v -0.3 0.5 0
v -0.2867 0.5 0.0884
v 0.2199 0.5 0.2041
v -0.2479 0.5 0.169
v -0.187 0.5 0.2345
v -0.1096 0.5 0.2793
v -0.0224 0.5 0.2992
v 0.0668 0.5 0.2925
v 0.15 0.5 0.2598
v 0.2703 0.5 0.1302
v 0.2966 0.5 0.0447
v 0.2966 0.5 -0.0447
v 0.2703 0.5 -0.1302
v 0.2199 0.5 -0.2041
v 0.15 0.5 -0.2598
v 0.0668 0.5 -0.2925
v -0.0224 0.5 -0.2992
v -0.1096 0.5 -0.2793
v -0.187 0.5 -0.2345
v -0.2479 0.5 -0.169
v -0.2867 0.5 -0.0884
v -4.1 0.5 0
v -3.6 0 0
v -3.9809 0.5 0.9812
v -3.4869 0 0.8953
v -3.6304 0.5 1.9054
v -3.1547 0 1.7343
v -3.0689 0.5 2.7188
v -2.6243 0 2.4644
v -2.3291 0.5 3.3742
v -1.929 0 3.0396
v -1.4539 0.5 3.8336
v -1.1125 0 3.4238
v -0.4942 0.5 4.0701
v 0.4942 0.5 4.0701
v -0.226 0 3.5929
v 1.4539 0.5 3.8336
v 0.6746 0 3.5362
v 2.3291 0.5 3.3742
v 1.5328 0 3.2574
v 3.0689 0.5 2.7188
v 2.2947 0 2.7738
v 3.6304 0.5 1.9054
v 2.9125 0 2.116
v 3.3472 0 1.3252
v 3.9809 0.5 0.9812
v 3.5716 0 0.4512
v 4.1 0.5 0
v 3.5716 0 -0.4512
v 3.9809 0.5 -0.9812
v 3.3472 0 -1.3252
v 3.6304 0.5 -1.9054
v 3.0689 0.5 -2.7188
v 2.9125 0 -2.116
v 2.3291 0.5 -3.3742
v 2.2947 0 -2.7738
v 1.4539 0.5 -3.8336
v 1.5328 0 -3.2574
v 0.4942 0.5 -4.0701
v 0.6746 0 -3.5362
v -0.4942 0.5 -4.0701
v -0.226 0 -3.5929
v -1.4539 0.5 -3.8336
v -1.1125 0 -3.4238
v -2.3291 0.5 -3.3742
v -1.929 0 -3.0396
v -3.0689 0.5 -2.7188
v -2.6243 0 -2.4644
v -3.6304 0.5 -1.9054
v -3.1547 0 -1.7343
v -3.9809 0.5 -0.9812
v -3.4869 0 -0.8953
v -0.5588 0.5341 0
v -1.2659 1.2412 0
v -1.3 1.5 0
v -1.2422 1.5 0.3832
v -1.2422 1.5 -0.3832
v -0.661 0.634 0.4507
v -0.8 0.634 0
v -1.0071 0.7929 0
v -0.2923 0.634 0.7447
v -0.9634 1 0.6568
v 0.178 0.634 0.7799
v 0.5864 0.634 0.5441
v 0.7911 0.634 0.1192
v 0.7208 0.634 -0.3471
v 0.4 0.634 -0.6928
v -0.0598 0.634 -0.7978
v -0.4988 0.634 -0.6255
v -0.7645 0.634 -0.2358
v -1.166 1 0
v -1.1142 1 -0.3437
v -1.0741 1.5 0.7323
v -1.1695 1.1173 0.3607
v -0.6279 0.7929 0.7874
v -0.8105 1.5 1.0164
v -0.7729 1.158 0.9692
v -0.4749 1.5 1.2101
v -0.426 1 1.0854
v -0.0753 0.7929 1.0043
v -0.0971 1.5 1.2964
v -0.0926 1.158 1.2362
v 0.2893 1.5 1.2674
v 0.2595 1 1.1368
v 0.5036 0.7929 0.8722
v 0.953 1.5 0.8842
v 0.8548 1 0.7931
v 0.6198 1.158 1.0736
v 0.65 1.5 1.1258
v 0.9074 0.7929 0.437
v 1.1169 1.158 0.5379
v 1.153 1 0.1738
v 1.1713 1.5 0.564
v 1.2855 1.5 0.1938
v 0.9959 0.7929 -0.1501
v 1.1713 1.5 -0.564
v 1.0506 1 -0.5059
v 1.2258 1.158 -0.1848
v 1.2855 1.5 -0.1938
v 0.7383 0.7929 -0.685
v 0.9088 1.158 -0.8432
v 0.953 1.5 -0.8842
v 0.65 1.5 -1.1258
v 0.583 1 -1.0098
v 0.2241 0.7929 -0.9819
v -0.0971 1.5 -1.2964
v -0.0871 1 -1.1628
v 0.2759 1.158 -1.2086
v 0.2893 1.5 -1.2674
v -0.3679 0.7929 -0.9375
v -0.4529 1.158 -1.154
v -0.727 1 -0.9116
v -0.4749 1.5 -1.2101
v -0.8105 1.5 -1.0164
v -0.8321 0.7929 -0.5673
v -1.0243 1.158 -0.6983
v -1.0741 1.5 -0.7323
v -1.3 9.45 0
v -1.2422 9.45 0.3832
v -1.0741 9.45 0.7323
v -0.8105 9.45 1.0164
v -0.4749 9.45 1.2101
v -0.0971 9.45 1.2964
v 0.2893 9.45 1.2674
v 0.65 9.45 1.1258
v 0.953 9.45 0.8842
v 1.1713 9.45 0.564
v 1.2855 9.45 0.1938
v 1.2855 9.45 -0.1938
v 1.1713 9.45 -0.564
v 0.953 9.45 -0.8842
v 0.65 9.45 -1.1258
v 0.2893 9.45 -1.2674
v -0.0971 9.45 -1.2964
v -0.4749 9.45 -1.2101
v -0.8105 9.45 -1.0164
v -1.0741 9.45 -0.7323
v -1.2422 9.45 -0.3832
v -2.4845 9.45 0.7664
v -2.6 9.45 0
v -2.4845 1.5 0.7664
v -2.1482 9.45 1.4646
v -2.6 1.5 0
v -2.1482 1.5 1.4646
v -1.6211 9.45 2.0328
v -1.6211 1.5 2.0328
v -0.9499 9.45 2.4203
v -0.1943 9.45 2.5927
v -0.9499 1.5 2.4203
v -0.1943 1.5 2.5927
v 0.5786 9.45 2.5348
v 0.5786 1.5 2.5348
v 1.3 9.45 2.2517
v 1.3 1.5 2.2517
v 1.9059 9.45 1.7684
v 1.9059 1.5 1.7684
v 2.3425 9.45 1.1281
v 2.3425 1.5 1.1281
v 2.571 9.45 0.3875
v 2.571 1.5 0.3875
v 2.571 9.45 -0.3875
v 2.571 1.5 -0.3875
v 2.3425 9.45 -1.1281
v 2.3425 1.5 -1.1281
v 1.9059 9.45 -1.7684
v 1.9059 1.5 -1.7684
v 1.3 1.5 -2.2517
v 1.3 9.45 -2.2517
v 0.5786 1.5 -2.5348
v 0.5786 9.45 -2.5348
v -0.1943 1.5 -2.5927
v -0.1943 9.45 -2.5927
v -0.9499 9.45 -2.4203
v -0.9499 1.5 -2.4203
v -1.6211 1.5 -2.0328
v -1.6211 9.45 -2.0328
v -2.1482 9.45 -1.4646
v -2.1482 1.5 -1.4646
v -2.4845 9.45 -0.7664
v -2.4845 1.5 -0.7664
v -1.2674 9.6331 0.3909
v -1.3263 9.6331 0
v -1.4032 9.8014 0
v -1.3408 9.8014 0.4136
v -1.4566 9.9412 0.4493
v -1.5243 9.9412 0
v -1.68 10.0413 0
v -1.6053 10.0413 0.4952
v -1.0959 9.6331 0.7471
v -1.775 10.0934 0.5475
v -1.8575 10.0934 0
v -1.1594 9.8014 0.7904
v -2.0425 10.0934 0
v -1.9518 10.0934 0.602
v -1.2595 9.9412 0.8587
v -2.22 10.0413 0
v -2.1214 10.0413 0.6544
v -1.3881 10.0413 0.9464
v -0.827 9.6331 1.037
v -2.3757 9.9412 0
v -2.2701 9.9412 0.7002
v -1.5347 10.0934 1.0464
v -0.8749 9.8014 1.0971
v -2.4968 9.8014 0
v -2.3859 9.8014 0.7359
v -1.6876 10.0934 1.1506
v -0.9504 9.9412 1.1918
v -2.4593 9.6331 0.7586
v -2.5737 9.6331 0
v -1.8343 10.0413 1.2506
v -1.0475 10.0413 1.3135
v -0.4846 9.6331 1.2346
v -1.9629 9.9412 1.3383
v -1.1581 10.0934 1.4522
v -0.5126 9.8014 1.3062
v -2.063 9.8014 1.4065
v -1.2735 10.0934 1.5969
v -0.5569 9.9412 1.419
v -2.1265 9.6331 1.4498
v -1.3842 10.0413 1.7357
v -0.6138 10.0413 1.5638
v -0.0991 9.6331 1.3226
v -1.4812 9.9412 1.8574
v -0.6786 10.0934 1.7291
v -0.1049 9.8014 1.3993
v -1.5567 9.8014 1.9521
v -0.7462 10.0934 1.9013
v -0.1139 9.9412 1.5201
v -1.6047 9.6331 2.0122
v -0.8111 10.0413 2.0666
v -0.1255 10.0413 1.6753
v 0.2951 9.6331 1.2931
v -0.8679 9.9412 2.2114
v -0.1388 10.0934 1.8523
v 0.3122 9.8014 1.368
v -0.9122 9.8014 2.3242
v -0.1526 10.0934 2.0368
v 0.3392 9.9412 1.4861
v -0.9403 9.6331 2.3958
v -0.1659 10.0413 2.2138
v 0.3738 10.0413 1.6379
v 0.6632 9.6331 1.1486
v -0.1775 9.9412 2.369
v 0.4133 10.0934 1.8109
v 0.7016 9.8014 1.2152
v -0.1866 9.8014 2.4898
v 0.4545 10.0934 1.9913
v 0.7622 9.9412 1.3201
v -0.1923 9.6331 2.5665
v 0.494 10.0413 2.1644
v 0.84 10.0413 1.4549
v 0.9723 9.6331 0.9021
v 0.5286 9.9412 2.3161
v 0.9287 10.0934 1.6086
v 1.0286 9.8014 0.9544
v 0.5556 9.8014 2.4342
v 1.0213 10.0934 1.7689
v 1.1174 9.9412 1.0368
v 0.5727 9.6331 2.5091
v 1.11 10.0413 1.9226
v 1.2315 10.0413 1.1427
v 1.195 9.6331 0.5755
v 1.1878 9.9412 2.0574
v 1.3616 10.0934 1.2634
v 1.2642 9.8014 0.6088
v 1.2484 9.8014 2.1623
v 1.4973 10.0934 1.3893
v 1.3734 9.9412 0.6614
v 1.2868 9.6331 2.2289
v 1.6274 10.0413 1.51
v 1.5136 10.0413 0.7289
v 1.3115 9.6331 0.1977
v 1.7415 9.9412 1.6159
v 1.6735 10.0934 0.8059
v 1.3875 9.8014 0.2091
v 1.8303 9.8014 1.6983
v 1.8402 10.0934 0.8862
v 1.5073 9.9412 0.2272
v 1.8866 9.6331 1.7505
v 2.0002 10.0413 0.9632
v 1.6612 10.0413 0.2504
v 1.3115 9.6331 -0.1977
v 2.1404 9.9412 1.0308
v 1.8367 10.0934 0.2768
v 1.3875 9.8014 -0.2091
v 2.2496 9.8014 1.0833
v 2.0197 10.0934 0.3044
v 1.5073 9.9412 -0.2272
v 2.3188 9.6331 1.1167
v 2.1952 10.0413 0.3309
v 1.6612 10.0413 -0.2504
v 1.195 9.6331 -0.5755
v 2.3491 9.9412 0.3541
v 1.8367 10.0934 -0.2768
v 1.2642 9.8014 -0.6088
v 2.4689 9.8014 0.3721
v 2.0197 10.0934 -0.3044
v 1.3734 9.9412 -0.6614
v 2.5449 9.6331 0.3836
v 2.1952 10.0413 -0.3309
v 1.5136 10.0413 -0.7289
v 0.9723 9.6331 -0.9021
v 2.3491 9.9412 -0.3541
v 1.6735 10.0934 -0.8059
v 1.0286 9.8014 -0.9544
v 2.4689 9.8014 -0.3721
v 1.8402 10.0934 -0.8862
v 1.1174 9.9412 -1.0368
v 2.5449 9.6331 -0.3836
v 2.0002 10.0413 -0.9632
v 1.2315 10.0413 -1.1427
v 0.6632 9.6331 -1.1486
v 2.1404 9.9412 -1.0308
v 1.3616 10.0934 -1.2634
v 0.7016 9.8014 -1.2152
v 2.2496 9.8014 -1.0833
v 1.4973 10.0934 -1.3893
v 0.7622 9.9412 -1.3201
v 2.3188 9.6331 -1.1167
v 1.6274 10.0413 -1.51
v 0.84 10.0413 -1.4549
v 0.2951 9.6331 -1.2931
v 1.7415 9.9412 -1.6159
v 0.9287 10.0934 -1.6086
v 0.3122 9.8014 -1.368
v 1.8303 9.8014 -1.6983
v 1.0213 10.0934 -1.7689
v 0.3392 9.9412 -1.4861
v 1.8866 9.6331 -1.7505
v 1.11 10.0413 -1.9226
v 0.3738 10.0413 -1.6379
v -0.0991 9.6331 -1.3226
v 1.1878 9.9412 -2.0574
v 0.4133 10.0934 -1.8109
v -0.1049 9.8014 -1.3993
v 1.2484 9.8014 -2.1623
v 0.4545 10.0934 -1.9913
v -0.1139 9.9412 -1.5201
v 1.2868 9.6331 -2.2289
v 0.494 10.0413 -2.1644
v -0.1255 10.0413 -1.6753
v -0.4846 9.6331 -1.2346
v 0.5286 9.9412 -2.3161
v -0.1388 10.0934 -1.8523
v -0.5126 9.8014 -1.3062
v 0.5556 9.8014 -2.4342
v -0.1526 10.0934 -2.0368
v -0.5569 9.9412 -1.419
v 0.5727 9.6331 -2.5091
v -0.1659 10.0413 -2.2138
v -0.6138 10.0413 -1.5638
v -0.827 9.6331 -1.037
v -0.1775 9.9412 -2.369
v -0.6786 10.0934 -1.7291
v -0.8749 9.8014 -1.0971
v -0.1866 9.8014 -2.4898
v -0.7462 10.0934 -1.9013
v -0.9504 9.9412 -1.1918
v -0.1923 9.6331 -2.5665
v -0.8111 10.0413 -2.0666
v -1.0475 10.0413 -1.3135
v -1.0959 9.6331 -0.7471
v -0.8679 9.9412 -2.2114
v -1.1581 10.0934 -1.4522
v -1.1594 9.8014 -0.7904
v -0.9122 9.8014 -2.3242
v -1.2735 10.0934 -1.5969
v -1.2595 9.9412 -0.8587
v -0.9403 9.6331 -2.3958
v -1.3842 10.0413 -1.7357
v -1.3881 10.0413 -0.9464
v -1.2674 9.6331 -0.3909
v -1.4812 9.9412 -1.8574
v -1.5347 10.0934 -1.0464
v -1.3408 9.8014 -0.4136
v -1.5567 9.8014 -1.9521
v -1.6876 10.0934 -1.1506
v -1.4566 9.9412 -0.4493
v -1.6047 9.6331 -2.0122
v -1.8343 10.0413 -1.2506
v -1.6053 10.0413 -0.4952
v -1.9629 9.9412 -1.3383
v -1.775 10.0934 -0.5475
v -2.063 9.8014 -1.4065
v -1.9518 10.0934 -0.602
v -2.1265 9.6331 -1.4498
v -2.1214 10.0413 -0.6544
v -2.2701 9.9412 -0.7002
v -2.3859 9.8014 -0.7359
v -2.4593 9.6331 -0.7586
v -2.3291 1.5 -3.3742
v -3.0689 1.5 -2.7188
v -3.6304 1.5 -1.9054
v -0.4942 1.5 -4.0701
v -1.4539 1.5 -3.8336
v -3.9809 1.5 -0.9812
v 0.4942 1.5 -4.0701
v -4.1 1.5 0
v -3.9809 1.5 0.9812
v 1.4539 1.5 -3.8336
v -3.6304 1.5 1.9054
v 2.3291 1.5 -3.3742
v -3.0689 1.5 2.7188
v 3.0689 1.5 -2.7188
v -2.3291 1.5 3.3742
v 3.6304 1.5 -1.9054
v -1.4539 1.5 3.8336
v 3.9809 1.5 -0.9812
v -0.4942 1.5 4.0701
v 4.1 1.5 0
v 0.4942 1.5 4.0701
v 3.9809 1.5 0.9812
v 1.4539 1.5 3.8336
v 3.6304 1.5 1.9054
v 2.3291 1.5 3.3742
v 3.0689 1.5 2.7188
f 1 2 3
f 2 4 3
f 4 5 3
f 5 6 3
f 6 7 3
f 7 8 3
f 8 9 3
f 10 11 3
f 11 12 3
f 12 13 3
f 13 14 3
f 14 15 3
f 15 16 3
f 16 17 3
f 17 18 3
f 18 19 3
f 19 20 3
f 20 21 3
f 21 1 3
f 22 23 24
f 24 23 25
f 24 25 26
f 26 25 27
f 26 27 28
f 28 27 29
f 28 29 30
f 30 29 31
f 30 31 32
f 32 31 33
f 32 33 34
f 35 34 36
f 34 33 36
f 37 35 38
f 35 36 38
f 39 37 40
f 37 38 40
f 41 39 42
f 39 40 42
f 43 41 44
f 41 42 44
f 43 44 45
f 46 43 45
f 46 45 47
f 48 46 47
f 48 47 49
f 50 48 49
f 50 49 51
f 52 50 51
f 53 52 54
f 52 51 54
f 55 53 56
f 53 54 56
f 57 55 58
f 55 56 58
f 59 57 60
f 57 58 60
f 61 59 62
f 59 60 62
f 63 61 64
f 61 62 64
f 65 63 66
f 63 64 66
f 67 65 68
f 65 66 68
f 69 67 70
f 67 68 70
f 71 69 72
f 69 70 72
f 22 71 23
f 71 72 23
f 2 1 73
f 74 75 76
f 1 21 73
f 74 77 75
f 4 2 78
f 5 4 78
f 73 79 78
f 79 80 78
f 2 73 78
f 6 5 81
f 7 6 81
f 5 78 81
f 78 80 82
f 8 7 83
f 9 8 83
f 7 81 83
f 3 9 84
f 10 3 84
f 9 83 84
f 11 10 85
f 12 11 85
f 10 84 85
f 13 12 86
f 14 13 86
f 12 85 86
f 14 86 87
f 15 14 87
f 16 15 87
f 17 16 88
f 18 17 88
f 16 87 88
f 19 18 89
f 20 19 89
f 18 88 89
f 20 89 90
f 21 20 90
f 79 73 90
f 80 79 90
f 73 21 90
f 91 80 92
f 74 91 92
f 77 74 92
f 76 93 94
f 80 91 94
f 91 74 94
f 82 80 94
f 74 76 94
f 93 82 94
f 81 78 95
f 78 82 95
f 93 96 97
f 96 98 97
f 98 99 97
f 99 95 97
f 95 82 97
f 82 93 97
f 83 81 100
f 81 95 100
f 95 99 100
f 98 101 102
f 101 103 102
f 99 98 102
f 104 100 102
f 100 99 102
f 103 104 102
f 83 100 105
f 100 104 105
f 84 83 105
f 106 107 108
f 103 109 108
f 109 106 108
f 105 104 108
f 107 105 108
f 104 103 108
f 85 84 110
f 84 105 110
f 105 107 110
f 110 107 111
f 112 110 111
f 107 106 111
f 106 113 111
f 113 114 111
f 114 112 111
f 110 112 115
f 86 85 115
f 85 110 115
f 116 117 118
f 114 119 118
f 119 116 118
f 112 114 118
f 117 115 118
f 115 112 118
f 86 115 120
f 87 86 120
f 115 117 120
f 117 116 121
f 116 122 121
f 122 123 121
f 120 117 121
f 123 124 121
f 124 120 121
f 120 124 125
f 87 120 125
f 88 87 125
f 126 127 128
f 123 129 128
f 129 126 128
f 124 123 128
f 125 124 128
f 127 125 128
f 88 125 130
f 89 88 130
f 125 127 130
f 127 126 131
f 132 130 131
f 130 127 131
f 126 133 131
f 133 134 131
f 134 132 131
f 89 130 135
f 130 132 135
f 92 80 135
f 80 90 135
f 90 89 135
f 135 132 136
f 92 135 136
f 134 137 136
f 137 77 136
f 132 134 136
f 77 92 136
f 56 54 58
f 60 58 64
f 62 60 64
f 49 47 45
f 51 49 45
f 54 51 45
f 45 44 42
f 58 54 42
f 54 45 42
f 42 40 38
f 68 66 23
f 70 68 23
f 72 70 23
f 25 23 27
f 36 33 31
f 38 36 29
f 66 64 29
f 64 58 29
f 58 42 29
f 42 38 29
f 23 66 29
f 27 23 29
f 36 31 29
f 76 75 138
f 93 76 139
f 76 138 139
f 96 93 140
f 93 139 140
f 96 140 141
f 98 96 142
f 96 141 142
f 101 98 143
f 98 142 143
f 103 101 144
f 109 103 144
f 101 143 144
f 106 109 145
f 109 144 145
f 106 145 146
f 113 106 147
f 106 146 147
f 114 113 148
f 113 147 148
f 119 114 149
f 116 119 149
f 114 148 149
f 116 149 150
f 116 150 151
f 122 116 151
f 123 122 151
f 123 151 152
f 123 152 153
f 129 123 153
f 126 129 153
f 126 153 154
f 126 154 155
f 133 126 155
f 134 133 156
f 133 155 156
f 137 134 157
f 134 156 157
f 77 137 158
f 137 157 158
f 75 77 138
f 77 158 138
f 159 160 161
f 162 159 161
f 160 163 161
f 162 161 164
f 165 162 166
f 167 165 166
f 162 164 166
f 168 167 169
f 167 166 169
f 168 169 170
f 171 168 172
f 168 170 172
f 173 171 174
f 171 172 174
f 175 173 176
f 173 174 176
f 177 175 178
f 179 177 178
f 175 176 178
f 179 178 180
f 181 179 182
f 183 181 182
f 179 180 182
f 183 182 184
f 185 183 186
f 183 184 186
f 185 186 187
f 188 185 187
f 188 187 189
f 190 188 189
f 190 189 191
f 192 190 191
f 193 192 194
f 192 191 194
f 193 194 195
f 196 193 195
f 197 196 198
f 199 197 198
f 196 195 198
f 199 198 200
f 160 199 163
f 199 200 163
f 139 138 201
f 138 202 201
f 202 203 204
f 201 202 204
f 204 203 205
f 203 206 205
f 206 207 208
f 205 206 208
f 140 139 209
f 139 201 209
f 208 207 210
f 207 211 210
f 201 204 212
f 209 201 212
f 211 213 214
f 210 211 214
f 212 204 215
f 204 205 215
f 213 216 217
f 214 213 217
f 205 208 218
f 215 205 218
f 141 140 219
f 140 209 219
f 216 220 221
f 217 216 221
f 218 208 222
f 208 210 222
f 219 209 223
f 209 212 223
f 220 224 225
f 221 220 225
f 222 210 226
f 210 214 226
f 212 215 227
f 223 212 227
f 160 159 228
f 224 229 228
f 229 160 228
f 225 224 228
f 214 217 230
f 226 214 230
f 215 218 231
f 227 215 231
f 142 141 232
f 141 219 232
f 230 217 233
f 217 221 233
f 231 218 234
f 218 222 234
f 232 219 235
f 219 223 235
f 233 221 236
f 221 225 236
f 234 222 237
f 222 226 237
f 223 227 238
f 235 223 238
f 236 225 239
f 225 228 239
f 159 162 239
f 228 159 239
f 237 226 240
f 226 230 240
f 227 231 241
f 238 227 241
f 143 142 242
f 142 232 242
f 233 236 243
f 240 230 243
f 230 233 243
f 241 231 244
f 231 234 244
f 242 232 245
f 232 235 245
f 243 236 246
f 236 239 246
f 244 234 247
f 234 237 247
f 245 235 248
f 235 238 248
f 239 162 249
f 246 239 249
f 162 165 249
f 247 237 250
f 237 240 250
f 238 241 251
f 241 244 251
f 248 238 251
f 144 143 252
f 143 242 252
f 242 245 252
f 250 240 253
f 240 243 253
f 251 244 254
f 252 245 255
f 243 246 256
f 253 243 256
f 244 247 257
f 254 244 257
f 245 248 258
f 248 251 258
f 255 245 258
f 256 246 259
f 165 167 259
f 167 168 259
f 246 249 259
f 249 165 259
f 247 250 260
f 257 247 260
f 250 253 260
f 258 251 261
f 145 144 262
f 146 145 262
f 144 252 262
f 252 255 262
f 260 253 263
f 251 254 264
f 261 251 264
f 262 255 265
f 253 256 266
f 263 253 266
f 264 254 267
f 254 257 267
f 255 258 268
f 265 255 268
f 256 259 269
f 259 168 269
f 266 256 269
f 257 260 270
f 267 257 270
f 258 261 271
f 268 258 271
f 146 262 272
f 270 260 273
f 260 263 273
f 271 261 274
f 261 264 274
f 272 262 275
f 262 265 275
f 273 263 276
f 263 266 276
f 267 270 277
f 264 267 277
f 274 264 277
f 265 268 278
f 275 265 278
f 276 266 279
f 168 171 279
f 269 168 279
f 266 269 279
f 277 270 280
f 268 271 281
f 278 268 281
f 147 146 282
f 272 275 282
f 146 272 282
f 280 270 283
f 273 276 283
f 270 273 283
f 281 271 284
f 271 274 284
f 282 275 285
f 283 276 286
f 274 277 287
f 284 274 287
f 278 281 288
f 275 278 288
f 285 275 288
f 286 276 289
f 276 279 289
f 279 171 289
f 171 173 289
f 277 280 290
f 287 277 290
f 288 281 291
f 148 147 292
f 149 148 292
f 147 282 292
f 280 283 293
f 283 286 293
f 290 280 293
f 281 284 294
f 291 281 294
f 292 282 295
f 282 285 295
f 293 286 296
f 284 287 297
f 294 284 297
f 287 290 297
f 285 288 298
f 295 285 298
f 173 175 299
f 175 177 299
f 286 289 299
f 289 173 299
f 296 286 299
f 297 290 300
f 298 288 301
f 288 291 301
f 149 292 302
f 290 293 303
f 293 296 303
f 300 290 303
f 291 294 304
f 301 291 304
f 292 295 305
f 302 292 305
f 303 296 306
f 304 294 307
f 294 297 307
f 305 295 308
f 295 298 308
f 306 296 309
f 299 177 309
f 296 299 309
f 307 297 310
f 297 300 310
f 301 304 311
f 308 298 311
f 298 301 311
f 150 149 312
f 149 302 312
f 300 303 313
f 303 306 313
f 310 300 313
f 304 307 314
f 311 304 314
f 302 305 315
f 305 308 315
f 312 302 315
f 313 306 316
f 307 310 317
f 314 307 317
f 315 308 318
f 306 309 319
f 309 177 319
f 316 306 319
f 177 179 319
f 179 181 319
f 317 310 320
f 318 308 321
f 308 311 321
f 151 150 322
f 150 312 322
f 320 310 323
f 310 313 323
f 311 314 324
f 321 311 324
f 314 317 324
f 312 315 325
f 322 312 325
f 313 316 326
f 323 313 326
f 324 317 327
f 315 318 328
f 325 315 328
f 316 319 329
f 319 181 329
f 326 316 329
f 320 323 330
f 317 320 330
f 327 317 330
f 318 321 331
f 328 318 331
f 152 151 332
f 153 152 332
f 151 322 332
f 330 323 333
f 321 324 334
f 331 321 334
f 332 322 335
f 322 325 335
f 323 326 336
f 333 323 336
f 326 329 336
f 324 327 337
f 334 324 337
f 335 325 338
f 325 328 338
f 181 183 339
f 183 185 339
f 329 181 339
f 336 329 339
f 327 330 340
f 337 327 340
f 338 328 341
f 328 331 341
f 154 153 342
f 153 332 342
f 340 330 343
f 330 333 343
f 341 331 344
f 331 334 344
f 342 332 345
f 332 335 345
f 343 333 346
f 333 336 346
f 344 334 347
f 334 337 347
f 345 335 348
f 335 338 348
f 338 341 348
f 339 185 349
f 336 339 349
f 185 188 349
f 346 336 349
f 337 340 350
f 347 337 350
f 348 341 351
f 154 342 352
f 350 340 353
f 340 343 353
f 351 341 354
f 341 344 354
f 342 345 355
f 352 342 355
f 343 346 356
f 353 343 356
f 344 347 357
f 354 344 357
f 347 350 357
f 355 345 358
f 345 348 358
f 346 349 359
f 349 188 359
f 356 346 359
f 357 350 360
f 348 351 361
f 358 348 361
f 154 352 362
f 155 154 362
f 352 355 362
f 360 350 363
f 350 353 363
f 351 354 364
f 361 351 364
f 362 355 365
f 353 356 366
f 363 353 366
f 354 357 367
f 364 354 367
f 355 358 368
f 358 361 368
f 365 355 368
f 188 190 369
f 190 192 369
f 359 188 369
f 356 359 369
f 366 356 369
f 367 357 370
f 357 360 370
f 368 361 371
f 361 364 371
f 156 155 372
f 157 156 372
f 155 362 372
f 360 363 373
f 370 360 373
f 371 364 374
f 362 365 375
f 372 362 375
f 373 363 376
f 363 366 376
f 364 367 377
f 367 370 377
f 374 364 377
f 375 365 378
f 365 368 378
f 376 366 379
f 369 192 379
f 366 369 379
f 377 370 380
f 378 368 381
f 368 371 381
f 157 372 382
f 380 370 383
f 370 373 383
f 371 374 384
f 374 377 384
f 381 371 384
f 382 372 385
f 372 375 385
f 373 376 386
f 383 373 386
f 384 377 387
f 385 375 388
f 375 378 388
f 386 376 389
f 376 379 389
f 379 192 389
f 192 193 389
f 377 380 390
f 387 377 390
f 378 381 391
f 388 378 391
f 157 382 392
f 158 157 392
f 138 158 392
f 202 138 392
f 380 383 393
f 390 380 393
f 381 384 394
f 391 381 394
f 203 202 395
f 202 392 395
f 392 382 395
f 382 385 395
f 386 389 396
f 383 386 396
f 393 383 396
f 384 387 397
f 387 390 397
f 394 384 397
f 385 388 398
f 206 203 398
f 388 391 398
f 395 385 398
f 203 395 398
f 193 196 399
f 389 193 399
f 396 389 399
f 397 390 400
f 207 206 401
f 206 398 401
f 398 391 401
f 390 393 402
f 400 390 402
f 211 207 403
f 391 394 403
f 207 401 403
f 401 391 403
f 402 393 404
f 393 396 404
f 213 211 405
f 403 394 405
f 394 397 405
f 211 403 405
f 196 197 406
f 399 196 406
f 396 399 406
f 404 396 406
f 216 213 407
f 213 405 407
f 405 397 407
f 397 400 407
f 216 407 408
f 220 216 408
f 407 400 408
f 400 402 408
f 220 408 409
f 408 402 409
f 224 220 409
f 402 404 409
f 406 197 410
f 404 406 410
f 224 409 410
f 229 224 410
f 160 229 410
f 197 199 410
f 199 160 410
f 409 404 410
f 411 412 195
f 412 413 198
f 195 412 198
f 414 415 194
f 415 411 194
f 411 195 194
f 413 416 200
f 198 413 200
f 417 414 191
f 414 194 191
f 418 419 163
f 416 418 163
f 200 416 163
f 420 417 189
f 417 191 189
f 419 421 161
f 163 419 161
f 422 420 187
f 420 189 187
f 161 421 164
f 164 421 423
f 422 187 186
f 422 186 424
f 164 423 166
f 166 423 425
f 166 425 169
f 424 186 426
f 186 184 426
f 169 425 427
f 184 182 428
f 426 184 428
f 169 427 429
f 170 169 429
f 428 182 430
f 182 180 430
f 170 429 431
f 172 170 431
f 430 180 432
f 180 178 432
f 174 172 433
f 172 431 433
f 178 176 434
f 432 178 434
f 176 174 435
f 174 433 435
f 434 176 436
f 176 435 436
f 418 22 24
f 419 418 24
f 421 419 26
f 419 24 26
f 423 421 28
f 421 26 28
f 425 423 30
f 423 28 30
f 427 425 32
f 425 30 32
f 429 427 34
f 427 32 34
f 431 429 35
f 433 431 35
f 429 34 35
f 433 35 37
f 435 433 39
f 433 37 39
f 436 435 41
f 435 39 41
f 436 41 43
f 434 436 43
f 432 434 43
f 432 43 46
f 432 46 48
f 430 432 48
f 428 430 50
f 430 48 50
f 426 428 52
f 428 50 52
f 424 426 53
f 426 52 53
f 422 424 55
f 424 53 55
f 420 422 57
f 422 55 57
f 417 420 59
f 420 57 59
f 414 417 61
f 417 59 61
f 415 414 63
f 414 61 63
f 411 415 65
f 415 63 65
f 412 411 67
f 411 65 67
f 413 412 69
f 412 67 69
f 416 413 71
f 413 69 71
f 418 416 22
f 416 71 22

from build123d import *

# Parameters (mm, degrees)
CHAMFER1_SIZE = 0.5


with BuildPart() as part:
    # Sketch1 → Revolve1 (revolve)
    with BuildSketch(Plane.XY):
        with BuildLine():
            Line((0, 0), (0, 0.5))
            Line((0, 0.5), (-0.3, 0.5))
            ThreePointArc((-0.3, 0.5), (-1.007106781, 0.792893219), (-1.3, 1.5))
            Line((-1.3, 1.5), (-1.3, 9.45))
            ThreePointArc((-1.3, 9.45), (-1.95, 10.1), (-2.6, 9.45))
            Line((-2.6, 9.45), (-2.6, 1.5))
            Line((-2.6, 1.5), (-4.1, 1.5))
            Line((-4.1, 1.5), (-4.1, 0))
            Line((-4.1, 0), (0, 0))
        make_face()
    revolve(axis=Axis((0, -1000, 0), (0, 1, 0)))

    # Chamfer1
    chamfer1_edges = [part.edges().sort_by_distance(p)[0] for p in [
        (4.1, 0, 0),
    ]]
    chamfer(chamfer1_edges, length=CHAMFER1_SIZE)


solid = part.part
